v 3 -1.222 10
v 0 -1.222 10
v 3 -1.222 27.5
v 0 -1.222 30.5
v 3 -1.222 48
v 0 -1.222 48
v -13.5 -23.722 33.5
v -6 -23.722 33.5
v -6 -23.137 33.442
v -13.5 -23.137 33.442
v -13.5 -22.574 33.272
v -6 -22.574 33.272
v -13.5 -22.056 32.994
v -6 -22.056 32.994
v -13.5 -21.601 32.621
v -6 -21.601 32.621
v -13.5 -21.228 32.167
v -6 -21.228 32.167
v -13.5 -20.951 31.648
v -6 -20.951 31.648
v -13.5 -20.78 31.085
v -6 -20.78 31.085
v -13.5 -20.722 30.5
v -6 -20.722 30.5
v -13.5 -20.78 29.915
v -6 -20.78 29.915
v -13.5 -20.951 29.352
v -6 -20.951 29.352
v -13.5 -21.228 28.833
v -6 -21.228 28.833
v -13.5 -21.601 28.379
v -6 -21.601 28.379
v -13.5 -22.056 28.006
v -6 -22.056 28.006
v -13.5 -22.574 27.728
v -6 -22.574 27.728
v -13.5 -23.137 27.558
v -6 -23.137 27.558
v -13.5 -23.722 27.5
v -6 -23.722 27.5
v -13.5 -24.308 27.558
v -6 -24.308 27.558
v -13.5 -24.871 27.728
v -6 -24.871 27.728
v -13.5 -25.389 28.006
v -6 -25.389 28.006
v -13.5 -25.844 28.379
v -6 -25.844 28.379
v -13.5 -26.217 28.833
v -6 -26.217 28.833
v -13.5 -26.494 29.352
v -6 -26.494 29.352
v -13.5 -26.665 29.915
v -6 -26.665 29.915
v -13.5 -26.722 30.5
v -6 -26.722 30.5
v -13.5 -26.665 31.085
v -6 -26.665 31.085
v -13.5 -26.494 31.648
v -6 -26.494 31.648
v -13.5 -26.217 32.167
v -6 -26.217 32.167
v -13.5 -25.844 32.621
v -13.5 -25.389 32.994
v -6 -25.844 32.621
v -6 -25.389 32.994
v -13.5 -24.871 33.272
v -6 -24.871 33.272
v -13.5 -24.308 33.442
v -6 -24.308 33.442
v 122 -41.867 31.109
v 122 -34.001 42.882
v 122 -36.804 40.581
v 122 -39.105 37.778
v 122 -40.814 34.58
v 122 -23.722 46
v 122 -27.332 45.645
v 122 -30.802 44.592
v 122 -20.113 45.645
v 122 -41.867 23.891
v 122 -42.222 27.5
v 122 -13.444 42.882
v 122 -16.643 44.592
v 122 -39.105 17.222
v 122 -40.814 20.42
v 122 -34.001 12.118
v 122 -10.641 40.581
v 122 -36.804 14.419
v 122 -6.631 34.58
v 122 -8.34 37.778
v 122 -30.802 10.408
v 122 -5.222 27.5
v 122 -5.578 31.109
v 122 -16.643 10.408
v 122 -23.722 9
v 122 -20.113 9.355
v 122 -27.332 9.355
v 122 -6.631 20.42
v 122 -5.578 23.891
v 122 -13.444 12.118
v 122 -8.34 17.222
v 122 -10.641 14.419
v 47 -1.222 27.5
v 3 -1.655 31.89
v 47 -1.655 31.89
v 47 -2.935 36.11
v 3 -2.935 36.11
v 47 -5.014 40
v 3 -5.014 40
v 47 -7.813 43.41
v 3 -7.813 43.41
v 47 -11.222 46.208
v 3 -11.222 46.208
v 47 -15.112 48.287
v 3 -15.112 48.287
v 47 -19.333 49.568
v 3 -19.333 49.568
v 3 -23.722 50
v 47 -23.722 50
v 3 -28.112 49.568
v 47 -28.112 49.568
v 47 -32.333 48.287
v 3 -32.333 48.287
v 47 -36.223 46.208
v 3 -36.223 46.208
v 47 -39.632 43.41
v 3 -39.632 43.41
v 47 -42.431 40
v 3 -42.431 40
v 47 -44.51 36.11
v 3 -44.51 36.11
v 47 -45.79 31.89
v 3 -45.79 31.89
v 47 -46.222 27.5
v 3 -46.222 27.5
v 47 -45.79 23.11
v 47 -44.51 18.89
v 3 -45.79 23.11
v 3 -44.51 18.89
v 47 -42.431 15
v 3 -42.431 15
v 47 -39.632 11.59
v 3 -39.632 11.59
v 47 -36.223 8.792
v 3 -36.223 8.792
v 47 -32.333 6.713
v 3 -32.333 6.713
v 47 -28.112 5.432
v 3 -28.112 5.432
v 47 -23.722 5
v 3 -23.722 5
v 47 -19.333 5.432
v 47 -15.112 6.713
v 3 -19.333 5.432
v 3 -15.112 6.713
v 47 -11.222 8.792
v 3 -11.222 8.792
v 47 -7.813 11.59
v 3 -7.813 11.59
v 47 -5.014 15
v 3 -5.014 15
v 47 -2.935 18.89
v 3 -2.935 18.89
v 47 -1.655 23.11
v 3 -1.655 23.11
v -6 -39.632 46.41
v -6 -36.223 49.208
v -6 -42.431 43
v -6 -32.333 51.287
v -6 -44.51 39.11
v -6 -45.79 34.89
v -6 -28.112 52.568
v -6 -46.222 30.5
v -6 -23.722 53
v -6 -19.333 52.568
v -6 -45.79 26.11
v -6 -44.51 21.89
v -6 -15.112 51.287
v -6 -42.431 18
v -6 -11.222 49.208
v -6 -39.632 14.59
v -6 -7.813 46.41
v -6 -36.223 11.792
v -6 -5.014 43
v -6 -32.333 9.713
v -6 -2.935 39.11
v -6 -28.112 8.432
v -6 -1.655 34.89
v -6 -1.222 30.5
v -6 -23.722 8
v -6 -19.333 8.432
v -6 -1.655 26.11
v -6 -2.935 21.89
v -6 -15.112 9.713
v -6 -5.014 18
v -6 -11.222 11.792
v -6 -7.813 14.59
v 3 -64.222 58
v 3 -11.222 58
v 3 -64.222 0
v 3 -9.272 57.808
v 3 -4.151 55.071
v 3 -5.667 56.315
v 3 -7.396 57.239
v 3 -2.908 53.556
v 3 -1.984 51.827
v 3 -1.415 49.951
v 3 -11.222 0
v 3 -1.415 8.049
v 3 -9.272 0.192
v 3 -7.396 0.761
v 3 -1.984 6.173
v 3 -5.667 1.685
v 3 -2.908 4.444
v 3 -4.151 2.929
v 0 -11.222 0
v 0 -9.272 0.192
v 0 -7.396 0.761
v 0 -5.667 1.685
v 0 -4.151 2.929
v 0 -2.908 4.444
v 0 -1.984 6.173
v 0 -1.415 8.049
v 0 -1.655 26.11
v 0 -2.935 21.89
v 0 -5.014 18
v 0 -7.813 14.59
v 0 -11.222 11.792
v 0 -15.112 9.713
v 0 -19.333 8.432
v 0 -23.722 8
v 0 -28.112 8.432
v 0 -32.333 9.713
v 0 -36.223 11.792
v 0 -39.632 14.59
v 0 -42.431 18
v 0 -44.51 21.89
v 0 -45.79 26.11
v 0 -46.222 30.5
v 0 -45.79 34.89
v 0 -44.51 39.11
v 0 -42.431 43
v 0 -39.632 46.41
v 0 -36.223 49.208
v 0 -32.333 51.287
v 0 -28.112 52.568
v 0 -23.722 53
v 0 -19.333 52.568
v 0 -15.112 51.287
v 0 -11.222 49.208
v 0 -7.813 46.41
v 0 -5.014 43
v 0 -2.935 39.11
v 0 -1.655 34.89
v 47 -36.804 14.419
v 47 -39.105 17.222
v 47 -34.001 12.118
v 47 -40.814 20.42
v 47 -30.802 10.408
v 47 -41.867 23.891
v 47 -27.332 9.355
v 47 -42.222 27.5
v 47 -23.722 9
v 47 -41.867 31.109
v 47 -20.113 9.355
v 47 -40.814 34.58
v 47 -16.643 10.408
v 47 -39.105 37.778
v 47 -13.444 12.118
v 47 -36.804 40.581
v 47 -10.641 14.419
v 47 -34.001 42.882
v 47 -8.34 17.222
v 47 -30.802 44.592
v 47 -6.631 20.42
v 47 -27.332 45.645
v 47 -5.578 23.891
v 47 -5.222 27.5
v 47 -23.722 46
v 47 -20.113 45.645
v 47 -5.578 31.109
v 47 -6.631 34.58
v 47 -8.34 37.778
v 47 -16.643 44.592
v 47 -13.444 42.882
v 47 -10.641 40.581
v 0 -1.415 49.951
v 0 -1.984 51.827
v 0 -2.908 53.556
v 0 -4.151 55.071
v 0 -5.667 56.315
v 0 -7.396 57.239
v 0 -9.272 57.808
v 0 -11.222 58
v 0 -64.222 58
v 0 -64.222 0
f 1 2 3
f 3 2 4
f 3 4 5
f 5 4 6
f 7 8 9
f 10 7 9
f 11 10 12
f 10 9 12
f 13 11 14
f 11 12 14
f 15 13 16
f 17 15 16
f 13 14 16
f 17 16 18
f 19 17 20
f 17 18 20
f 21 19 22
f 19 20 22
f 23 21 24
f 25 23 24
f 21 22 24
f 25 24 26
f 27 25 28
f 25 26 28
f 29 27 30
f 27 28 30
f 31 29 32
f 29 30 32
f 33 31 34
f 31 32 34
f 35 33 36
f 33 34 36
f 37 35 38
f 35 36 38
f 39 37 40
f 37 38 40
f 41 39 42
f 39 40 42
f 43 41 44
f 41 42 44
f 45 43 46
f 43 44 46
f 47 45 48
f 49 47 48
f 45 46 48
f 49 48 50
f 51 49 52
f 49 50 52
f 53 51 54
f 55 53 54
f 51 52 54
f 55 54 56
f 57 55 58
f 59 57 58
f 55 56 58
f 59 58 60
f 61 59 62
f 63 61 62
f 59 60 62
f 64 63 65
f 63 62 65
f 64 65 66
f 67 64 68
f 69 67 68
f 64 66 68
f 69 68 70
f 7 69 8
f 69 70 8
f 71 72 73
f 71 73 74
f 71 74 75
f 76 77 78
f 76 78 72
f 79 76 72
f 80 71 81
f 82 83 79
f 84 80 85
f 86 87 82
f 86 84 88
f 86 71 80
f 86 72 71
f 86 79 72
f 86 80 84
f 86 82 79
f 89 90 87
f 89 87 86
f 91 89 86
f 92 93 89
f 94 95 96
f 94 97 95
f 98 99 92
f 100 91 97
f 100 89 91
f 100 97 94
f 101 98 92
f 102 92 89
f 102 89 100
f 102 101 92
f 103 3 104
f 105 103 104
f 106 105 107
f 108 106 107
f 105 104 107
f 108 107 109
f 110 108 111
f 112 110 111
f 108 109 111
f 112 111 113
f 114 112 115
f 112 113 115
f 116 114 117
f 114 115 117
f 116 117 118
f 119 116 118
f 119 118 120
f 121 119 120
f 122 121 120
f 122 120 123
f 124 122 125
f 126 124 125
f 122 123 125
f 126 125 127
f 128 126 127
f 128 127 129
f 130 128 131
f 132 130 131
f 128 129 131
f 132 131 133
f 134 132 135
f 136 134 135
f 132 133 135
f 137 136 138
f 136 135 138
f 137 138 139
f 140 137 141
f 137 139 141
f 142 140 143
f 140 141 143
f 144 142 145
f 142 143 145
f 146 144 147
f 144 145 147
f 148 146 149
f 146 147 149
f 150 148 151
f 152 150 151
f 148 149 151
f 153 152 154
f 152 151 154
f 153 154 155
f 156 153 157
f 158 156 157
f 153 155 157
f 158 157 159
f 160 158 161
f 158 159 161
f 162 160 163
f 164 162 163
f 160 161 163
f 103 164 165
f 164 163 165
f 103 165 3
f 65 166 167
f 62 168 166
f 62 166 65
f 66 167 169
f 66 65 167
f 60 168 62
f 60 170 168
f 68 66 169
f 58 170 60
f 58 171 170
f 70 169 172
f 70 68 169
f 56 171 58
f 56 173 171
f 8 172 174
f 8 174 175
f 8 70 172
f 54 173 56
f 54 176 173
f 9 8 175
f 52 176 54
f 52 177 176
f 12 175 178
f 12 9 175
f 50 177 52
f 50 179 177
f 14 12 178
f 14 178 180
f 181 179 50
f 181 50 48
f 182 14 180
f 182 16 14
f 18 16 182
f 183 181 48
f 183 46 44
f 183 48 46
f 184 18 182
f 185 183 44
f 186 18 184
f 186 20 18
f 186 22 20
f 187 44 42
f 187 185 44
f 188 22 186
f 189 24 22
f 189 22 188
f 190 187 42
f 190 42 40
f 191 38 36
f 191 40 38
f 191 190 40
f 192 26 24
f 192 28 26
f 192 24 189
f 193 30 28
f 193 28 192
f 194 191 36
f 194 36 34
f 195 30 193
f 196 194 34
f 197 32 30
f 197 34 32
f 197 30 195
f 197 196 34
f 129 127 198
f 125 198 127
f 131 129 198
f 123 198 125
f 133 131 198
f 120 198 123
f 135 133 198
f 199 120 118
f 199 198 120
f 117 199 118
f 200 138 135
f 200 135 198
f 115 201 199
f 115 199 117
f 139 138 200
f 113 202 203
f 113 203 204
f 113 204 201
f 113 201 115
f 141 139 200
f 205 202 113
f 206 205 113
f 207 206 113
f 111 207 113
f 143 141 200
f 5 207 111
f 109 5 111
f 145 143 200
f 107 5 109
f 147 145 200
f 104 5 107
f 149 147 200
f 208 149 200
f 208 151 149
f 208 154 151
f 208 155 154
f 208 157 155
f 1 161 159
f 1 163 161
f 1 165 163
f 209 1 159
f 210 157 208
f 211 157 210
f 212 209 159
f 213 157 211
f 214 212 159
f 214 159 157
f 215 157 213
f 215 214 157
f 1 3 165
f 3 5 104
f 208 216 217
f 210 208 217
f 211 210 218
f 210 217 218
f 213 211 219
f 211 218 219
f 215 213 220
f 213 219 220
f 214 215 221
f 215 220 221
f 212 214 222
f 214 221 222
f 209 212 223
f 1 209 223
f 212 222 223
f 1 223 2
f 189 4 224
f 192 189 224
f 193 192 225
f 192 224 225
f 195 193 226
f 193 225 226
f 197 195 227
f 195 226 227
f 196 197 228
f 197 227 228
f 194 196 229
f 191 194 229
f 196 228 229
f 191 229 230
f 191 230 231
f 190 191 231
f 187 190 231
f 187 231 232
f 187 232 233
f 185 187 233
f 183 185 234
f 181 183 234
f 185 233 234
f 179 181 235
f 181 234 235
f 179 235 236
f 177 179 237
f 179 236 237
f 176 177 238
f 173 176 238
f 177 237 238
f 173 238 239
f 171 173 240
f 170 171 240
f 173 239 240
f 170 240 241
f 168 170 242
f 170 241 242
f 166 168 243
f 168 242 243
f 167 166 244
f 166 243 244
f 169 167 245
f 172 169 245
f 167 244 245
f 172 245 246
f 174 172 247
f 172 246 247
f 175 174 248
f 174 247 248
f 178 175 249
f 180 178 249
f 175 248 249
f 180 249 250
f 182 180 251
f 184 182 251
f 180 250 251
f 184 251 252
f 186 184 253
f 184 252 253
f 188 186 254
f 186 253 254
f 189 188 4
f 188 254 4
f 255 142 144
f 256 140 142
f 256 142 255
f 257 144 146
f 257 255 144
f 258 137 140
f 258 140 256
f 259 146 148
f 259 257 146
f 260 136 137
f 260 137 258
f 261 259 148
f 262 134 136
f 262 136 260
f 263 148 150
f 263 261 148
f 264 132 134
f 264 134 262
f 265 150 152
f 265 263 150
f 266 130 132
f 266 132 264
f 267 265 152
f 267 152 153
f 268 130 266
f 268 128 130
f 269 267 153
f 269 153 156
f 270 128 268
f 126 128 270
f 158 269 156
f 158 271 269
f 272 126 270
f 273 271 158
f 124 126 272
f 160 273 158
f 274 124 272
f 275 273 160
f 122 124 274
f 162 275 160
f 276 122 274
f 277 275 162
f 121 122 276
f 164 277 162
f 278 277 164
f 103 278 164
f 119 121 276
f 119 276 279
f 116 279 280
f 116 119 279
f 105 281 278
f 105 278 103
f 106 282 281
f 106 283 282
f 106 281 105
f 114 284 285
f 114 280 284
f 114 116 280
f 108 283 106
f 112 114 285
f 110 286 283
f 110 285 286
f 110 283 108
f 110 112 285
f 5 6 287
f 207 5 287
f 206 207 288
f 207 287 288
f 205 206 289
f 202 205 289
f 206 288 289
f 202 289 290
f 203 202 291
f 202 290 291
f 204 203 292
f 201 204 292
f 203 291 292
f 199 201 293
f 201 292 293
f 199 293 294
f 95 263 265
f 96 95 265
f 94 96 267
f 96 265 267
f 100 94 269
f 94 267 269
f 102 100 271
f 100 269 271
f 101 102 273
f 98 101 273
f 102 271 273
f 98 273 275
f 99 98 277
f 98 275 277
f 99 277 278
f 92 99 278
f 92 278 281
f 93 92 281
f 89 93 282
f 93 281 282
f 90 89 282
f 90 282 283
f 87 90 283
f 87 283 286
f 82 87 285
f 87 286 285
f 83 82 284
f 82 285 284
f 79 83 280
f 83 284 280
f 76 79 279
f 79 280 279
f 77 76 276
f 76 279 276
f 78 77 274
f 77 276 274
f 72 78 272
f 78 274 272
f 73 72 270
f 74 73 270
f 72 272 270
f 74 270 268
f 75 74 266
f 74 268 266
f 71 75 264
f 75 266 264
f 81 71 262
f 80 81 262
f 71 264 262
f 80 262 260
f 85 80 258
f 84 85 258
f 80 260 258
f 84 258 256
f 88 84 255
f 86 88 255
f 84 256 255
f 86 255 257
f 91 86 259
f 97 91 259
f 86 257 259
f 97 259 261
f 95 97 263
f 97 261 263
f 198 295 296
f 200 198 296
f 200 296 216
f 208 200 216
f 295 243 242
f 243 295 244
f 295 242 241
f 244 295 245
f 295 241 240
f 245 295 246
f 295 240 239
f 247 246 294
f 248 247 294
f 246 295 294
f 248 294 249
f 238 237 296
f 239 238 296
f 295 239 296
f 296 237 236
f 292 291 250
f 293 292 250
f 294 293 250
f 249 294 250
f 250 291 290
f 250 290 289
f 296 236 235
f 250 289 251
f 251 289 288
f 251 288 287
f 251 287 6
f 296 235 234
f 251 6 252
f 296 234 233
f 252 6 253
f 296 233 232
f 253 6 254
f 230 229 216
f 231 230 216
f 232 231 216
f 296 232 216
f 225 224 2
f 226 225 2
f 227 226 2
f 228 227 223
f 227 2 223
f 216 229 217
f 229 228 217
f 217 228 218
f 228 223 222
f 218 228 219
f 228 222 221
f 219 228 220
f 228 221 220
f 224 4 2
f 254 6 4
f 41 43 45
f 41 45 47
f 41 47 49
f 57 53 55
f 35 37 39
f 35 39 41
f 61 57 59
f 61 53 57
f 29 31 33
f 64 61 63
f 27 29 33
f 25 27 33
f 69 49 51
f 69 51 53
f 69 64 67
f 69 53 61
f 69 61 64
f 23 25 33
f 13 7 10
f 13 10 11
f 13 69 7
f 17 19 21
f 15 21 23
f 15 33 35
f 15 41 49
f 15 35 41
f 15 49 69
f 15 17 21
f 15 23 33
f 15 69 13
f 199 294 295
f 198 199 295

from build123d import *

# Parameters (mm, degrees)
BOSS_EXTRUDE1_DEPTH = 3
SKETCH2_R           = 22.5
BOSS_EXTRUDE2_DEPTH = 44
SKETCH3_R           = 18.5
BOSS_EXTRUDE3_DEPTH = 75
SKETCH4_R           = 22.5
BOSS_EXTRUDE4_DEPTH = 6
SKETCH5_R           = 3
BOSS_EXTRUDE5_DEPTH = 7.5


with BuildPart() as part:
    # Sketch1 → Boss-Extrude1 (new body)
    with BuildSketch(Plane(origin=(0, 0, 0), x_dir=(0, 0, -1), z_dir=(1, 0, 0))):
        with BuildLine():
            Line((-10, -1.222482436), (-48, -1.222482436))
            ThreePointArc((-48, -1.222482436), (-55.071067812, -4.151414624), (-58, -11.222482436))
            Line((-58, -11.222482436), (-58, -64.222482436))
            Line((-58, -64.222482436), (0, -64.222482436))
            Line((0, -64.222482436), (0, -11.222482436))
            ThreePointArc((0, -11.222482436), (-2.928932188, -4.151414624), (-10, -1.222482436))
        make_face()
    extrude(amount=BOSS_EXTRUDE1_DEPTH)

    # Sketch2 → Boss-Extrude2 (add)
    with BuildSketch(Plane(origin=(3, 0, 0), x_dir=(0, 0, -1), z_dir=(1, 0, 0))):
        with Locations(Location((-27.5, -23.722482436, 0), (0, 0, 90))):
            Circle(SKETCH2_R)
    extrude(amount=BOSS_EXTRUDE2_DEPTH)

    # Sketch3 → Boss-Extrude3 (add)
    with BuildSketch(Plane(origin=(47, 0, 0), x_dir=(0, 0, -1), z_dir=(1, 0, 0))):
        with Locations((-27.5, -23.722482436)):
            Circle(SKETCH3_R)
    extrude(amount=BOSS_EXTRUDE3_DEPTH)

    # Sketch4 → Boss-Extrude4 (add)
    with BuildSketch(Plane.ZY):
        with Locations(Location((30.5, -23.722482436, 0), (0, 0, 90))):
            Circle(SKETCH4_R)
    extrude(amount=BOSS_EXTRUDE4_DEPTH)

    # Sketch5 → Boss-Extrude5 (add)
    with BuildSketch(Plane.ZY.offset(6)):
        with Locations((30.5, -23.722482436)):
            Circle(SKETCH5_R)
    extrude(amount=BOSS_EXTRUDE5_DEPTH)


solid = part.part
